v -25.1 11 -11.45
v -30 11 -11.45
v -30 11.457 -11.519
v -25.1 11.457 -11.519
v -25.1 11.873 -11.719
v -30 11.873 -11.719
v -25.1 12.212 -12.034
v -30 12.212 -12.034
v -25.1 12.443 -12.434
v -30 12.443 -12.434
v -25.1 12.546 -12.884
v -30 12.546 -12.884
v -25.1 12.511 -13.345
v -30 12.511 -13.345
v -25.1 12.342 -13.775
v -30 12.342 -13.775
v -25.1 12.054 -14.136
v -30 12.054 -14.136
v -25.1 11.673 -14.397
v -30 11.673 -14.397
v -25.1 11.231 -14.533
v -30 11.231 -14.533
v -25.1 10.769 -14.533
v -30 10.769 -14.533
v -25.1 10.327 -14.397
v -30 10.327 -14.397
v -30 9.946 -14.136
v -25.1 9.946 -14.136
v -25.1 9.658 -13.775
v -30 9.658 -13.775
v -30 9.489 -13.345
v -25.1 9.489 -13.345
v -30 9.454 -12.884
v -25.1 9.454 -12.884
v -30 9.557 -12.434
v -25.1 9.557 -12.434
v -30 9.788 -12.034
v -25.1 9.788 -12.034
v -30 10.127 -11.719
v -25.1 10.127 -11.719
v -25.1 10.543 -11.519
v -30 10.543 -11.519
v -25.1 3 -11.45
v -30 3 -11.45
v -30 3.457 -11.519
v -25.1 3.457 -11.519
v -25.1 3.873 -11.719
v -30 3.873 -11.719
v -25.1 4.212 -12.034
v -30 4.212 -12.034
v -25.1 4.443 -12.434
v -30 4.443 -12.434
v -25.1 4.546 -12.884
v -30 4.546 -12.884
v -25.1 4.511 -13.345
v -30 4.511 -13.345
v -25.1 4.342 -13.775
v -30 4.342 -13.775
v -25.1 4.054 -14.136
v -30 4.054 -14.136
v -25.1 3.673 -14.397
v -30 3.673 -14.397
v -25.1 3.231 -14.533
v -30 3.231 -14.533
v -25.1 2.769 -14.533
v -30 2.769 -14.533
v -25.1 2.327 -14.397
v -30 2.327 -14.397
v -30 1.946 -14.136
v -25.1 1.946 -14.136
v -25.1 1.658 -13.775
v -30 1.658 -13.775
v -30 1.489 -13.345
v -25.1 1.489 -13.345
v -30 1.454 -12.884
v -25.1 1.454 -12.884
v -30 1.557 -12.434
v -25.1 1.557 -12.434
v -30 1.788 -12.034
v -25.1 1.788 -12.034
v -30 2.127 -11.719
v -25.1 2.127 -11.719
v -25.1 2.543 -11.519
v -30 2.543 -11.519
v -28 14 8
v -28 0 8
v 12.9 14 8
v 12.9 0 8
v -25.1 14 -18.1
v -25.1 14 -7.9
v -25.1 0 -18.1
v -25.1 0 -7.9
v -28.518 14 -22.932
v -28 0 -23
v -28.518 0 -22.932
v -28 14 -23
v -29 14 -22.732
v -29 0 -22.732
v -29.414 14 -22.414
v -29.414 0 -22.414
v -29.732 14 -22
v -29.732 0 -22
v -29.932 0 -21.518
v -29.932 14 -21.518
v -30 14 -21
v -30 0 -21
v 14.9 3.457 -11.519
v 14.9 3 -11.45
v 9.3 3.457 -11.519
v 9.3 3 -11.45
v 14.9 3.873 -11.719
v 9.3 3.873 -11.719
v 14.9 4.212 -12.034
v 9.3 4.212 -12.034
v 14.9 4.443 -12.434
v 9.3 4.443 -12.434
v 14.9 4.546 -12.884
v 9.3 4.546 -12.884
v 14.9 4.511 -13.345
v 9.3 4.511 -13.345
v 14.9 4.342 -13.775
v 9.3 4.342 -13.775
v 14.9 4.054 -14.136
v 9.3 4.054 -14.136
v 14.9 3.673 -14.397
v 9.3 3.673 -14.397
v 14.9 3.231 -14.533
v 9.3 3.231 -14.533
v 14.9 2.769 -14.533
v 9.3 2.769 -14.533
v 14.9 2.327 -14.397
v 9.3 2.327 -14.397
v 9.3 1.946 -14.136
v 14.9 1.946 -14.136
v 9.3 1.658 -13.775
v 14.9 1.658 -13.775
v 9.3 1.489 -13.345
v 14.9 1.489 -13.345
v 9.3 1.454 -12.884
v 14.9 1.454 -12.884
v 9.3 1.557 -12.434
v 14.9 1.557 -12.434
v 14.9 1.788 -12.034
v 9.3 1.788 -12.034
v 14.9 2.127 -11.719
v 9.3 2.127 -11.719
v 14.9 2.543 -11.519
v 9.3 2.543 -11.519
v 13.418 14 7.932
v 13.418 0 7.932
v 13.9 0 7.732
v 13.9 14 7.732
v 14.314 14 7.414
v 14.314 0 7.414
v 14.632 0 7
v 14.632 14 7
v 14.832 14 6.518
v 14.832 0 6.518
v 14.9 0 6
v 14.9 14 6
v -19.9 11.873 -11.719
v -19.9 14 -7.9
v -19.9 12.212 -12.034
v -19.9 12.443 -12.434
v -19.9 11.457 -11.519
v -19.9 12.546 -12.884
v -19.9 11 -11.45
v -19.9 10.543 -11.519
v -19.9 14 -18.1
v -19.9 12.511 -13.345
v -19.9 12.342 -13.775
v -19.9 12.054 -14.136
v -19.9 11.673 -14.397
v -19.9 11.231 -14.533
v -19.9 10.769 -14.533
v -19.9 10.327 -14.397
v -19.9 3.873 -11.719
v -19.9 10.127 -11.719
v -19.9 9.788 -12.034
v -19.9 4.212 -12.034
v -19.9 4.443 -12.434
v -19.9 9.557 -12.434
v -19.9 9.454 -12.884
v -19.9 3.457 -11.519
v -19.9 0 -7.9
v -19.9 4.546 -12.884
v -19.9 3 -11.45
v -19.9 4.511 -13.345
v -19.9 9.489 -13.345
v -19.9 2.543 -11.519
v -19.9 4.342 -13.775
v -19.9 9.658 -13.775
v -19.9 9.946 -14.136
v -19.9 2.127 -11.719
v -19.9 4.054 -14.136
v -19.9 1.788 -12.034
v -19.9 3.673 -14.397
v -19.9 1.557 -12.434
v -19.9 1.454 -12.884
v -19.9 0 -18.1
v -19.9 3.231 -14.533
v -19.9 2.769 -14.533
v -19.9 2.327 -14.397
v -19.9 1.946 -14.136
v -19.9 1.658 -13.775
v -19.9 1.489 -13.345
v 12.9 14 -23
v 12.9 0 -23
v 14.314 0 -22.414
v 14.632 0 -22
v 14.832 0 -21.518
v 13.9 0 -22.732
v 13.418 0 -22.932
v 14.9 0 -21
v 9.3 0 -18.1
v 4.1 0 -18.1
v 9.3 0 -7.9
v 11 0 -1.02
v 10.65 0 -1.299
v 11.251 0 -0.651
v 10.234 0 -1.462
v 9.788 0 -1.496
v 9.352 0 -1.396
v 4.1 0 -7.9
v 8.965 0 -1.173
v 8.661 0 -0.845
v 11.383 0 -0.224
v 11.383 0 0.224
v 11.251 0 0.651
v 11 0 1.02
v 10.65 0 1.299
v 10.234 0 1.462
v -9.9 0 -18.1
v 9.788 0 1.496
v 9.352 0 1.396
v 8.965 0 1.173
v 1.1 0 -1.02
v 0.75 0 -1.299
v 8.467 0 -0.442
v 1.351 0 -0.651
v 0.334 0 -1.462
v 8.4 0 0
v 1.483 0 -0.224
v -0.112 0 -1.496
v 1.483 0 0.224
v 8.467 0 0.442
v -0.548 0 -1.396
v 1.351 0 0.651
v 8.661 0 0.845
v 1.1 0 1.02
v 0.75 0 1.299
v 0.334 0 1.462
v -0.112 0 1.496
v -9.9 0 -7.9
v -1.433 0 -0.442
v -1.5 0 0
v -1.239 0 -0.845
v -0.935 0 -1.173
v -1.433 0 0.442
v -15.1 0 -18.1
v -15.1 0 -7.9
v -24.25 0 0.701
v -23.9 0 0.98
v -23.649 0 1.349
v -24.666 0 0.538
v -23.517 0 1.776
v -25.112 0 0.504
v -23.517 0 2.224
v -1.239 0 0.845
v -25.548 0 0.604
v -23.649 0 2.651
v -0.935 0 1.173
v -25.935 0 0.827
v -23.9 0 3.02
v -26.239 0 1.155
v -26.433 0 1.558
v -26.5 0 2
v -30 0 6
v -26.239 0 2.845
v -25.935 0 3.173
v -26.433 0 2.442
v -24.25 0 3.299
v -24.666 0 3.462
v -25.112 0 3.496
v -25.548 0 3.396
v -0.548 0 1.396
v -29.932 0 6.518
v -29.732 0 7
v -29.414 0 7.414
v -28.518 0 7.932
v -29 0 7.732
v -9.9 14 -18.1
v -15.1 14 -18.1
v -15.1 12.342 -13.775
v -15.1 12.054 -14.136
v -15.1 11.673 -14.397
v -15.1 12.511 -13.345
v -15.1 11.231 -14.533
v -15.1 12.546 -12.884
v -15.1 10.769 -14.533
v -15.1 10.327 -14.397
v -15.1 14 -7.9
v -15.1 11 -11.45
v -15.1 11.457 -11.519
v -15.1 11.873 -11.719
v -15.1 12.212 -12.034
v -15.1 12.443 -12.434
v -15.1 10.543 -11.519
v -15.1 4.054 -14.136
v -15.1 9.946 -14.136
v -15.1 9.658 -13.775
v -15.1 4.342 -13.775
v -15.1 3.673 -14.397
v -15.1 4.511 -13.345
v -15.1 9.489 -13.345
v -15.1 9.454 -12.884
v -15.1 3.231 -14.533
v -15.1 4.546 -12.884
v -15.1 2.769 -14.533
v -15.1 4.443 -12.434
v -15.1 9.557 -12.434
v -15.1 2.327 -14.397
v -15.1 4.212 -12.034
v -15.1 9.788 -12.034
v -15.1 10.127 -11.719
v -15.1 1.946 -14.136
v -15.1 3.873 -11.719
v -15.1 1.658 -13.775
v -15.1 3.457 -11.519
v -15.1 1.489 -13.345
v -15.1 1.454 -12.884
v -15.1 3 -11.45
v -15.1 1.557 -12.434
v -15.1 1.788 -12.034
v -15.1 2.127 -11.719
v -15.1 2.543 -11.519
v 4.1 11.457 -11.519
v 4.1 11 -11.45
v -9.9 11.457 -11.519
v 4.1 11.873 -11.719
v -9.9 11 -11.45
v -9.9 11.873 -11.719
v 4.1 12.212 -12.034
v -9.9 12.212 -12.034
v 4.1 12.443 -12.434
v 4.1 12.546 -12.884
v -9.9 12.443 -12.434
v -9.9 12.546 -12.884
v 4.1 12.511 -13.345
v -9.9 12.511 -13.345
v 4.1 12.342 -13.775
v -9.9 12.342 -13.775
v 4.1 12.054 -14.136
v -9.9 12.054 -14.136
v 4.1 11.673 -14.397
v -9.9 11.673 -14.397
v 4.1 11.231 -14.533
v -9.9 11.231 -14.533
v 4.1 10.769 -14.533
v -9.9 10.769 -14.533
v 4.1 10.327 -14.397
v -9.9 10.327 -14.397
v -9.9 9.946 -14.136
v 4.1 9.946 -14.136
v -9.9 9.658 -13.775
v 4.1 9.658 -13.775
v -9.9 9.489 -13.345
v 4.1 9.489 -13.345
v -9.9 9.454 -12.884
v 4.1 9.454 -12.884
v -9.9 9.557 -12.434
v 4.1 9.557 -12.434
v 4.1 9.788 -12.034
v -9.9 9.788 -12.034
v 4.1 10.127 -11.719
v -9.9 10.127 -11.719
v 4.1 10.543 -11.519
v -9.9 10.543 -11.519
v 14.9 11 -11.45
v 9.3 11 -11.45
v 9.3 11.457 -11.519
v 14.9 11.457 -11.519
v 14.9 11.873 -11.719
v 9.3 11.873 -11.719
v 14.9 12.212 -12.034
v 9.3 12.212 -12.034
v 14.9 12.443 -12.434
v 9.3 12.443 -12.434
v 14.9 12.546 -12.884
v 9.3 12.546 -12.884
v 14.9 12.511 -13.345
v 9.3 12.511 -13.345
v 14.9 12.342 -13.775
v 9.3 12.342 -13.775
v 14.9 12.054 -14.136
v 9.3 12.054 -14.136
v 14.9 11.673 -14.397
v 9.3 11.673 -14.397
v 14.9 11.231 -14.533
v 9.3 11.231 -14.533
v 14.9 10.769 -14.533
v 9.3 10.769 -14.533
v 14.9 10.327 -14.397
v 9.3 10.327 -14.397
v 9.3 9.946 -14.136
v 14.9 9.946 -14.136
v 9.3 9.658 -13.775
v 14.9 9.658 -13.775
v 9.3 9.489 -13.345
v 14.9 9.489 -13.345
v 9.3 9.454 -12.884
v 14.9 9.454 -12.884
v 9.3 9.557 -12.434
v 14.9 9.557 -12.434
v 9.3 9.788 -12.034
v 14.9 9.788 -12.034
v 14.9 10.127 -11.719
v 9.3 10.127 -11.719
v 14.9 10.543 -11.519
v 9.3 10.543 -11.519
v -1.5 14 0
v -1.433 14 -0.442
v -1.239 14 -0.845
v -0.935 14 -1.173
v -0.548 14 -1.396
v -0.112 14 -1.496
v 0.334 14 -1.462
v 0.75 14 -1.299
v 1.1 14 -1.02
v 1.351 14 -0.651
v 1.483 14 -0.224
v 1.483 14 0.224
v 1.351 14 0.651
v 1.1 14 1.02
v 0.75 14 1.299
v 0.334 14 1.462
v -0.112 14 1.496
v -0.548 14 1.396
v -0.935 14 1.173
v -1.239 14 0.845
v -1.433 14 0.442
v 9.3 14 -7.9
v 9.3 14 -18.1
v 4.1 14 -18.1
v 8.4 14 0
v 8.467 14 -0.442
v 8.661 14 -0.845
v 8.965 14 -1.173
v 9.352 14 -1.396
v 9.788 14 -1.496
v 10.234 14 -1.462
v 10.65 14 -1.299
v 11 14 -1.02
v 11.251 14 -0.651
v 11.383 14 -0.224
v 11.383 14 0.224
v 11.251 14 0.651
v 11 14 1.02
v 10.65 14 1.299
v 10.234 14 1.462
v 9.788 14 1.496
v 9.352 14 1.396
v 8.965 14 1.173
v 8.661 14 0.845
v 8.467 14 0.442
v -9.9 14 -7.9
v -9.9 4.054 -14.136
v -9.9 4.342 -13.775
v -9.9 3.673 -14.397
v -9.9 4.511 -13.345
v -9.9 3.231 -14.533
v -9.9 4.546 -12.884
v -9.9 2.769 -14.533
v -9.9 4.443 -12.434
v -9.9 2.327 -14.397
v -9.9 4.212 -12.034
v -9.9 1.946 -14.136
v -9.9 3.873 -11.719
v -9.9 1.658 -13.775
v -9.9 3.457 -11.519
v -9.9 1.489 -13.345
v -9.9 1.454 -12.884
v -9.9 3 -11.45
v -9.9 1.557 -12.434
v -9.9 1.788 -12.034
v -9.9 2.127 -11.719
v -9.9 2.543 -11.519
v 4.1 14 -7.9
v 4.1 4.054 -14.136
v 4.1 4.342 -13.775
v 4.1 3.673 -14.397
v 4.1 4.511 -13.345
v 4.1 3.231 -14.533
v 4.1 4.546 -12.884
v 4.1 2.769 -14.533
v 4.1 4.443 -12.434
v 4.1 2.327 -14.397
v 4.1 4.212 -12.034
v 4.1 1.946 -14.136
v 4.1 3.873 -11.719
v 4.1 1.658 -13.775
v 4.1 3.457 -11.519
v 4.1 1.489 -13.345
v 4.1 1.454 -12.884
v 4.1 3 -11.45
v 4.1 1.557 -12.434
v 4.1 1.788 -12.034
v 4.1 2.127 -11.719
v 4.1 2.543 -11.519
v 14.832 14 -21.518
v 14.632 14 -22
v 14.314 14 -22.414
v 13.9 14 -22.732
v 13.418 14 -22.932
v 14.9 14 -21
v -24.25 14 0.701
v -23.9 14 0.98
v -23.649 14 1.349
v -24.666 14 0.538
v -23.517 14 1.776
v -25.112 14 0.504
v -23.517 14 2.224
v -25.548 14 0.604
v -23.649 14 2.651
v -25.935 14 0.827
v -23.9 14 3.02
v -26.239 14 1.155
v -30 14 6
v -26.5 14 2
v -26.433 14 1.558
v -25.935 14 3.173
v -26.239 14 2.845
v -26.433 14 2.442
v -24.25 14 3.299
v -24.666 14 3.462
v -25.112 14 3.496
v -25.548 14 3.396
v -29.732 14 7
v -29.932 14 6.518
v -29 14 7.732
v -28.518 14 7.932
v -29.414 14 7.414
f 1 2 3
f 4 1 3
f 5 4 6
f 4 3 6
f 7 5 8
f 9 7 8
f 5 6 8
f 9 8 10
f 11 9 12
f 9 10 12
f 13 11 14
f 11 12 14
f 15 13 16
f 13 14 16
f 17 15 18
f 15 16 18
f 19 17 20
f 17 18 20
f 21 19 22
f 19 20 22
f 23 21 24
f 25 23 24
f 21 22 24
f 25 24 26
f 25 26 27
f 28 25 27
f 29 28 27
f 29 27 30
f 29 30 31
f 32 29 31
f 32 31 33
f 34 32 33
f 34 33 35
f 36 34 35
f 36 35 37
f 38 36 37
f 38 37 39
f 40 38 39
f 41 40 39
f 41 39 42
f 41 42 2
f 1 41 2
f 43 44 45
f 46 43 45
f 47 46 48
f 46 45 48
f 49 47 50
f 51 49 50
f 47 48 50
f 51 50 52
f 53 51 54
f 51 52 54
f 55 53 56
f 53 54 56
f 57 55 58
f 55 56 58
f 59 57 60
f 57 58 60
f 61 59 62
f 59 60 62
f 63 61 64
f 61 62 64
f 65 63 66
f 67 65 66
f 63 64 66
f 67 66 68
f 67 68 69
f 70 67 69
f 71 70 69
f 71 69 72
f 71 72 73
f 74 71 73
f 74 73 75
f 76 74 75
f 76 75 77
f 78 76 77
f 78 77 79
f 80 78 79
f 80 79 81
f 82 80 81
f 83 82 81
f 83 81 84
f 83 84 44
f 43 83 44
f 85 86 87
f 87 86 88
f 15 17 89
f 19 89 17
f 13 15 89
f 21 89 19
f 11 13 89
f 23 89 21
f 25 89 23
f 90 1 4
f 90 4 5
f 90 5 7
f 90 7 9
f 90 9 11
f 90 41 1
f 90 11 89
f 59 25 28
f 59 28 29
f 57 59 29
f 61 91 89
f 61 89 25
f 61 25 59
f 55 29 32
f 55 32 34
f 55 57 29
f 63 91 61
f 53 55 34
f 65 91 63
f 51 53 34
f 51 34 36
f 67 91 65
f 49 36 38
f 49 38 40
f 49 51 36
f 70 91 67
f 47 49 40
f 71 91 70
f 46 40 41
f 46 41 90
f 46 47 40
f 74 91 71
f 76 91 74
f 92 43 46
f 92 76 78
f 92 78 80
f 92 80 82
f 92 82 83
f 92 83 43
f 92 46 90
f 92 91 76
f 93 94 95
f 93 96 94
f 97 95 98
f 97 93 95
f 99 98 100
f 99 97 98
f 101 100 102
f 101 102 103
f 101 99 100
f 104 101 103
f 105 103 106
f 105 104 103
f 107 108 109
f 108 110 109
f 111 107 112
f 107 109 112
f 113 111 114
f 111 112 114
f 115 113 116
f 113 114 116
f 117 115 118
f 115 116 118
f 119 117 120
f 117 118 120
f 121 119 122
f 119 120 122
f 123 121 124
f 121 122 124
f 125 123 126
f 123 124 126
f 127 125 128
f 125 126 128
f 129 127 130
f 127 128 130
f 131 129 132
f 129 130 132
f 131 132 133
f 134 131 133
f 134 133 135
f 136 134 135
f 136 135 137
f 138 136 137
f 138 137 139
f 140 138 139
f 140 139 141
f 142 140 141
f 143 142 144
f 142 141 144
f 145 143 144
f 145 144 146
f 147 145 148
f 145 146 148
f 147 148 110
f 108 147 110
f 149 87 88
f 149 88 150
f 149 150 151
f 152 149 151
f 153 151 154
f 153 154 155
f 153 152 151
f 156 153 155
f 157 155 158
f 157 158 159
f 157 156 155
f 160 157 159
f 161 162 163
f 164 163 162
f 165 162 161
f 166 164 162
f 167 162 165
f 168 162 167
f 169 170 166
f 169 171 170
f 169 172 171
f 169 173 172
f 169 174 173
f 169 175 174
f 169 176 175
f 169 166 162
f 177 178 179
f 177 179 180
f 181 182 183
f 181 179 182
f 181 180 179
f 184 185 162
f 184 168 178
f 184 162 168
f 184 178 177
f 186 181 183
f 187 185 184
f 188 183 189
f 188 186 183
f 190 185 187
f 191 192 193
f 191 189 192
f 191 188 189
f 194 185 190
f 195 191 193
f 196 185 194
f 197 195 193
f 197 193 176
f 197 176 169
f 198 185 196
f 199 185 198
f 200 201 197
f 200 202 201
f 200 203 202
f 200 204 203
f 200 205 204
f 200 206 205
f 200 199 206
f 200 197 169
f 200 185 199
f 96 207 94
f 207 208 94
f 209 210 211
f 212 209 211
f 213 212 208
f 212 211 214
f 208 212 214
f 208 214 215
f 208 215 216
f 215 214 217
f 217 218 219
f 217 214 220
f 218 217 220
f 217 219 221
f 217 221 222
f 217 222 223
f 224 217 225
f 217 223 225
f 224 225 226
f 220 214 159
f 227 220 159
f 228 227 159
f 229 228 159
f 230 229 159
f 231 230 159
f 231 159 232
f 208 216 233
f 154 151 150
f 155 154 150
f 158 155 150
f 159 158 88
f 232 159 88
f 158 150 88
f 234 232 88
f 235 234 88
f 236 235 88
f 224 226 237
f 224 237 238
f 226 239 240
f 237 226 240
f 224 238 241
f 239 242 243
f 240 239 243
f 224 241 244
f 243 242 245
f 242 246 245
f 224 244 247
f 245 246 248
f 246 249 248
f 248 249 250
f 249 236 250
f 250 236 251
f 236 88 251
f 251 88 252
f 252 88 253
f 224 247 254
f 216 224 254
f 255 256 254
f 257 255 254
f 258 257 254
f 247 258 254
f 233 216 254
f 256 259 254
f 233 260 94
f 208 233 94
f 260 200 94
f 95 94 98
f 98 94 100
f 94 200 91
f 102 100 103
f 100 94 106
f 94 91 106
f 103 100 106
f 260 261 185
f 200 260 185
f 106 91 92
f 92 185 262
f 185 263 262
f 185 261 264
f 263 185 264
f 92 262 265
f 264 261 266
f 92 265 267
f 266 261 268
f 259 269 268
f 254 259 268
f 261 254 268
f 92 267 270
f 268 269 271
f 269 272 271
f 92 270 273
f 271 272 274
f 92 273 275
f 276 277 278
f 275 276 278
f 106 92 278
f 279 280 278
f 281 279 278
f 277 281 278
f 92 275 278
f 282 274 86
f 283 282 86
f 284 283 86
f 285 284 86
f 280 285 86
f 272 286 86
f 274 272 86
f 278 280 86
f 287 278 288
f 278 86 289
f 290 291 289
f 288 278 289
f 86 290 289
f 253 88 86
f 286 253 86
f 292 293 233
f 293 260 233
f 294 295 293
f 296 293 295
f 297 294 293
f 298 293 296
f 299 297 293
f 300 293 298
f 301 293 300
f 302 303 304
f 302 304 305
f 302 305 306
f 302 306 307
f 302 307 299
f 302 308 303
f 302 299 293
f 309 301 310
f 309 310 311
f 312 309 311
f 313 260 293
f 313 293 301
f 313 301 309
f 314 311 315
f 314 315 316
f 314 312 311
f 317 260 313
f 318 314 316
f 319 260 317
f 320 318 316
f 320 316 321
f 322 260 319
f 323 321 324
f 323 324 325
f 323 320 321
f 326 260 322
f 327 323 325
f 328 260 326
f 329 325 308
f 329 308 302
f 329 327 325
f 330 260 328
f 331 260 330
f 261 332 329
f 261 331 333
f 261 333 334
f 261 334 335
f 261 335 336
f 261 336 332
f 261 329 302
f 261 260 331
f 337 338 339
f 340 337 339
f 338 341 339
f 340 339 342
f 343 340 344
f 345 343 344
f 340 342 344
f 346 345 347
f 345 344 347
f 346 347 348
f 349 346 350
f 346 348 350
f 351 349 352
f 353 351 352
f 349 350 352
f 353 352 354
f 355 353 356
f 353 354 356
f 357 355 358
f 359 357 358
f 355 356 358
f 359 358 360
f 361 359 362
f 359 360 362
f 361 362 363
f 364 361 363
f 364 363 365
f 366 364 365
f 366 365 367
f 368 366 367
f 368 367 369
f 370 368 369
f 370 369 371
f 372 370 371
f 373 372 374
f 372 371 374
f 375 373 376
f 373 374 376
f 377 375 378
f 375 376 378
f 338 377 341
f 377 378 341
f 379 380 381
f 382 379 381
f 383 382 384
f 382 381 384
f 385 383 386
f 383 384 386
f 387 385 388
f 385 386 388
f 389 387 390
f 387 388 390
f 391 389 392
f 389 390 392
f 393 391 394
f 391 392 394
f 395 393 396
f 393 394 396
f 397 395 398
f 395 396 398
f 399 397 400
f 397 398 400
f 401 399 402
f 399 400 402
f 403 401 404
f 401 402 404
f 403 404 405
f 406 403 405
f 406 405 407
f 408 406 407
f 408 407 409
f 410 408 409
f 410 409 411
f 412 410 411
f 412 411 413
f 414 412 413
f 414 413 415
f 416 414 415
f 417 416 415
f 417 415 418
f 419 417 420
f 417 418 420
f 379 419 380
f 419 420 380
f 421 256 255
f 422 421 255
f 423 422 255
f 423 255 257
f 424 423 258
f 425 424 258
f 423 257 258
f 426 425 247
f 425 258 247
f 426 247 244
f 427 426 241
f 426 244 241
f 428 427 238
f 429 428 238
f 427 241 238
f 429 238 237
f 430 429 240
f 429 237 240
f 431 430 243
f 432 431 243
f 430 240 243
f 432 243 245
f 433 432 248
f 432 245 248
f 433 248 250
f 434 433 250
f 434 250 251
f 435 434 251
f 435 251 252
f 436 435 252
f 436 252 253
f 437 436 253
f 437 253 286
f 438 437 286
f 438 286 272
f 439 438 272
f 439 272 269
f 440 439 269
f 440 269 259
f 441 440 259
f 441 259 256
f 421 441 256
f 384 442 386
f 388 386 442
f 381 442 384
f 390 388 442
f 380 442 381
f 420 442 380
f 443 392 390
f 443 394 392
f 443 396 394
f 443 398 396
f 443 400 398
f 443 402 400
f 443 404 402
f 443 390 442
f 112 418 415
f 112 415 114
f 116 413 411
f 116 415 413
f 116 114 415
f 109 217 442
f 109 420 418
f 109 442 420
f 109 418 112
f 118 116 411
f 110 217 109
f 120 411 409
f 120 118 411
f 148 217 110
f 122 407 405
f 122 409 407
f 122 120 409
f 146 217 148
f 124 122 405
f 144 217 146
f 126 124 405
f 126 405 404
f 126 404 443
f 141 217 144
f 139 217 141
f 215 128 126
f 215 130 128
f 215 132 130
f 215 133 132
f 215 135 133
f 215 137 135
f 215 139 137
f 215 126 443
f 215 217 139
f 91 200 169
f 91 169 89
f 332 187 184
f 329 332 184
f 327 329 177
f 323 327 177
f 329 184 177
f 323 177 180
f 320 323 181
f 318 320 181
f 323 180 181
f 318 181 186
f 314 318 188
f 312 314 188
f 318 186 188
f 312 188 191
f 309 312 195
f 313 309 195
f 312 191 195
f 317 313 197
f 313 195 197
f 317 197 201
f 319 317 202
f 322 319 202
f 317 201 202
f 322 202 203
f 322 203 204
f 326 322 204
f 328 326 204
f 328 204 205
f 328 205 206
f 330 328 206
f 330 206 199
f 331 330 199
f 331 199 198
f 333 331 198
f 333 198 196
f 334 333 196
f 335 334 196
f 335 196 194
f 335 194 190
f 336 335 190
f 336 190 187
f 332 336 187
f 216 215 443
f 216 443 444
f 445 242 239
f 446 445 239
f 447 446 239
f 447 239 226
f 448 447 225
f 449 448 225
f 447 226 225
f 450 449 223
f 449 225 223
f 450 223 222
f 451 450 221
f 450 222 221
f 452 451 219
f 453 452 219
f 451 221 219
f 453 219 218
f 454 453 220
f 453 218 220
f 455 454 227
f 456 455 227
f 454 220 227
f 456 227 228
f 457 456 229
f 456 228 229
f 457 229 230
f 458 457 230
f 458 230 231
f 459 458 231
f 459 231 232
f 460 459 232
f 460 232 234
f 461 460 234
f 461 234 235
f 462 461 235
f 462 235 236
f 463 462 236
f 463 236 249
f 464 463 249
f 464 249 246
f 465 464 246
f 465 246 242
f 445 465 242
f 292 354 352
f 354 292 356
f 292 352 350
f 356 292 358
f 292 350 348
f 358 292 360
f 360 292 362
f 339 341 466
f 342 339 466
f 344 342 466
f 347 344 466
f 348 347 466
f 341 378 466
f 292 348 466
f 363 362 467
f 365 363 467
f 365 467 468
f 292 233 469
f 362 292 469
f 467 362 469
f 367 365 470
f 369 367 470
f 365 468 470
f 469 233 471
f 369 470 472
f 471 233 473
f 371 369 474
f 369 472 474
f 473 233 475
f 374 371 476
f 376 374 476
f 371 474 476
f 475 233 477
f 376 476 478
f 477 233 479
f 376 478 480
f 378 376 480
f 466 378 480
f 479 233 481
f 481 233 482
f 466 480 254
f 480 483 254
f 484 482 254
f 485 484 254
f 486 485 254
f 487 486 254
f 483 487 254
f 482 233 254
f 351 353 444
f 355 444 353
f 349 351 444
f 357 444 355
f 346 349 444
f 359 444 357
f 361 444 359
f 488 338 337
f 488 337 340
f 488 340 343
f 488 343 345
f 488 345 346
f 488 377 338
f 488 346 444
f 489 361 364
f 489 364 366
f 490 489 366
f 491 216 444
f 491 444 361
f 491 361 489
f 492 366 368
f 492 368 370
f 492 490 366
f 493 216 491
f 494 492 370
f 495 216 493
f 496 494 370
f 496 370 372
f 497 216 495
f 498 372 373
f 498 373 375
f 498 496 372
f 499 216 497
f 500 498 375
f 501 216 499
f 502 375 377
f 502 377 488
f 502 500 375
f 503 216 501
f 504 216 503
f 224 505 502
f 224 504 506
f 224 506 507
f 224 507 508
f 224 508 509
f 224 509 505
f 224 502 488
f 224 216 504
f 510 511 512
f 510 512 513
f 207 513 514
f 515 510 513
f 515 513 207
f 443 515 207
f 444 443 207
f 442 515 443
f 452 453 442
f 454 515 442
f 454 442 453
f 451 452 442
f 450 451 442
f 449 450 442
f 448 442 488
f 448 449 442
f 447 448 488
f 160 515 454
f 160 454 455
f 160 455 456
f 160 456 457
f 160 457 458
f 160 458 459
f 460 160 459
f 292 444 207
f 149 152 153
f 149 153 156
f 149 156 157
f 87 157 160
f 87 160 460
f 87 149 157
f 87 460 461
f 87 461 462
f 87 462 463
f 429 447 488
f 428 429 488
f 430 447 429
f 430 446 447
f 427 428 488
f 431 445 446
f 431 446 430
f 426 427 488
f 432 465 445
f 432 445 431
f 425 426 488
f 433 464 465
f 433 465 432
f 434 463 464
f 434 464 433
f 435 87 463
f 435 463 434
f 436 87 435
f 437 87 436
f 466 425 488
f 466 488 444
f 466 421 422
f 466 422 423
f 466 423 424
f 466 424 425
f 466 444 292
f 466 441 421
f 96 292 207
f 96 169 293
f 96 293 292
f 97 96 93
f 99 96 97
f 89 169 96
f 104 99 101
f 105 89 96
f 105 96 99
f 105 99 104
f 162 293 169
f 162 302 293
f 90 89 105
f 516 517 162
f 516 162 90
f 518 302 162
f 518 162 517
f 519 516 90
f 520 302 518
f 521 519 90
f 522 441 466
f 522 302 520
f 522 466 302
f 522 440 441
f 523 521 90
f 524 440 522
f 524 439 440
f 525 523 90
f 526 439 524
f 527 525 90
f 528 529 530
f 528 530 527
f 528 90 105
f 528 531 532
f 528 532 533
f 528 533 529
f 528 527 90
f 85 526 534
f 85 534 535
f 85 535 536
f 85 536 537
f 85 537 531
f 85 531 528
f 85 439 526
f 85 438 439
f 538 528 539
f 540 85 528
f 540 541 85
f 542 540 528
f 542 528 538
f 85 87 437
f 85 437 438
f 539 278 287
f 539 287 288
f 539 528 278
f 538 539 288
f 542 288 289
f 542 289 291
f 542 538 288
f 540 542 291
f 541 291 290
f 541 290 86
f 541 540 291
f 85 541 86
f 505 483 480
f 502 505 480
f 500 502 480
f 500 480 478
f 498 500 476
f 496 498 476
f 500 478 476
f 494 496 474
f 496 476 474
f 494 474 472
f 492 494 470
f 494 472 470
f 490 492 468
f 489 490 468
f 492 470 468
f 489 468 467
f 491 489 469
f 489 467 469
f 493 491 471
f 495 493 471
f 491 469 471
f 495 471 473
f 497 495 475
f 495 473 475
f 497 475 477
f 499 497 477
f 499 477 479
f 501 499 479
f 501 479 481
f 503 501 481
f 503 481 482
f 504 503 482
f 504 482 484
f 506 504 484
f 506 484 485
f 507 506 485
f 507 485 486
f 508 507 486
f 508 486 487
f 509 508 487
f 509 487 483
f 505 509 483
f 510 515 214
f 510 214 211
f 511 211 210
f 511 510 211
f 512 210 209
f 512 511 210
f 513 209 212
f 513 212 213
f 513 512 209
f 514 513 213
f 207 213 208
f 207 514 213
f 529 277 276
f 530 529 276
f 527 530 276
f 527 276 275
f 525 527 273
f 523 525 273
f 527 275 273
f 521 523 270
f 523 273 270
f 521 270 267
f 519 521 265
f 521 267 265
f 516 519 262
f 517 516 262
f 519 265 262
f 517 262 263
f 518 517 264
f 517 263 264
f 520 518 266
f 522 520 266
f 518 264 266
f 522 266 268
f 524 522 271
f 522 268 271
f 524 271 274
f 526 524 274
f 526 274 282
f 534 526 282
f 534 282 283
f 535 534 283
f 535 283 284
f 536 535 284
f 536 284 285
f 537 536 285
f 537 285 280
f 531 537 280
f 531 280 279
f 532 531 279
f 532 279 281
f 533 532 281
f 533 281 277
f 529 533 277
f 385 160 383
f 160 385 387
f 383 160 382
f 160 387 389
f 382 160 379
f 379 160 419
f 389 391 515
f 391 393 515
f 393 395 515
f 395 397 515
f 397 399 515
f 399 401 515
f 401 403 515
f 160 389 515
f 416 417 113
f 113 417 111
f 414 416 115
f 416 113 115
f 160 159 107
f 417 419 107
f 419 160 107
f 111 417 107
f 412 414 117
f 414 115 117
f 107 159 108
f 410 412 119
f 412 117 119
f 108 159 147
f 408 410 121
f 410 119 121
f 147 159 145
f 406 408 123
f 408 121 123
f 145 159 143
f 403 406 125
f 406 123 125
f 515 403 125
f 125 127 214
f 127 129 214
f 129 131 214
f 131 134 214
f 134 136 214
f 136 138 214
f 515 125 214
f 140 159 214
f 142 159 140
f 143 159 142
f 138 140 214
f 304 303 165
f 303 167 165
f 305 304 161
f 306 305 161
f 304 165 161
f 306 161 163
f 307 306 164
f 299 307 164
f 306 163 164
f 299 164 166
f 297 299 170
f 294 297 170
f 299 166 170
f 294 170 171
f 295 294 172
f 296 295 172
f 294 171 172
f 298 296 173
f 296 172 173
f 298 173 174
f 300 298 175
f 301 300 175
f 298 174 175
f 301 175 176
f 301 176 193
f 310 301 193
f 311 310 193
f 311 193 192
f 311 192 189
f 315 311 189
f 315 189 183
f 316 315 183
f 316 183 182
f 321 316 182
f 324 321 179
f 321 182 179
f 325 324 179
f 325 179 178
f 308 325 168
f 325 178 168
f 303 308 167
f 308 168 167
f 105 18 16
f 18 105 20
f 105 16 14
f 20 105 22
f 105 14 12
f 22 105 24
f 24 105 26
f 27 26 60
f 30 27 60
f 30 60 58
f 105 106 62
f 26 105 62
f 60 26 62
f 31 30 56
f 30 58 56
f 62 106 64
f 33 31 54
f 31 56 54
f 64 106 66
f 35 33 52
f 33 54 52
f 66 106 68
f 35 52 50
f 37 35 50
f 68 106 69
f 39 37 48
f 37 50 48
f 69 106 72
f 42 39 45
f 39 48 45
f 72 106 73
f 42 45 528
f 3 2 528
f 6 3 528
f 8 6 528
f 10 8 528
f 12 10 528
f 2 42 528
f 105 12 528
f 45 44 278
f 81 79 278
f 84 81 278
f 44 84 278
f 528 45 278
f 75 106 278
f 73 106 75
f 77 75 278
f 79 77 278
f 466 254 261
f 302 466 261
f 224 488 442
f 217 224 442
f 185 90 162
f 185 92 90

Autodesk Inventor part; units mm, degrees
ref_plane "YZ Plane" through (0, 0, 0) normal (1, 0, 0) x (0, 1, 0)
ref_plane "XZ Plane" through (0, 0, 0) normal (0, 1, 0) x (-1, 0, 0)
ref_plane "XY Plane" through (0, 0, 0) normal (0, 0, 1) x (1, 0, 0)
sketch "Sketch1" plane through (0, 0, 0) normal (0, 1, 0) x (-1, 0, 0)
  circle A0 centre (0, 0) radius 1.5
  circle A1 centre (25, 2) radius 1.5
  line L0 (30, 8) -> (-14.9, 8)
  line L1 (-14.9, 8) -> (-14.9, -23)
  line L2 (-14.9, -23) -> (30, -23)
  line L3 (30, -23) -> (30, 8)
  line L4 (-14.9, -8) -> (30, -8) construction
  circle A2 centre (-9.9, 0) radius 1.5
  line L5 (25, -8) -> (20, -8)
  line L6 (20, -8) -> (20, -18)
  line L7 (20, -18) -> (25, -18)
  line L8 (25, -18) -> (25, -8)
  line L9 (20, -8) -> (20, -18)
  line L10 (20, -18) -> (15, -18)
  line L11 (15, -18) -> (15, -8)
  line L12 (15, -8) -> (20, -8)
  line L13 (15, -8) -> (15, -18)
  line L14 (15, -18) -> (10, -18)
  line L15 (10, -18) -> (10, -8)
  line L16 (10, -8) -> (15, -8)
  line L17 (-4.2, -23) -> (-14.9, -23)
  line L18 (-14.9, -23) -> (-14.9, -8)
  line L19 (-9.2, -8) -> (-9.2, -18)
  line L20 (-9.2, -18) -> (-4.2, -18)
  line L21 (-4.2, -18) -> (-4.2, -8)
  line L22 (-4.2, -8) -> (-9.2, -8)
  dimension "d0" = 3
  dimension "d1" = 3
  dimension "d3" = 25
  dimension "d4" = 2
  dimension "d5" = 8
  dimension "d6" = 6
  dimension "d7" = 5
  dimension "d9" = 3
  dimension "d10" = 9.9
  dimension "d11" = 5
  dimension "d12" = 10
  dimension "d13" = 5
  dimension "d14" = 5
  dimension "d15" = 5
  dimension "d16" = 5
  dimension "d37" = 5
  dimension "d38" = 14.2
  dimension "d39" = 5
extrude "Extrusion1" add sketch "Sketch1" along normal blind 14 contours L3 L2 L1 L0 | L6 L10 L11 L12
fillet "Fillet1" radius 2 4 edges at (-30, 7, 8) (-30, 7, -23) (14.9, 7, 8) (14.9, 7, -23)
sketch "Sketch2" plane through (-30, 0, -21) normal (-1, 0, 0) x (0, 0, 1)
  line L0 (3, 0) -> (13, 0) projected
  line L1 (13, 0) -> (13, 14) projected
  line L2 (3, 14) -> (13, 14) projected
  line L3 (3, 0) -> (3, 14) projected
  circle A0 centre (8, 11) radius 1.55
  circle A1 centre (8, 3) radius 1.55
  line L4 (3, 0) -> (3, 14) projected
  point P0 (21, 0)
  dimension "d21" = 3.1
  dimension "d22" = 3.1
  dimension "d23" = 3
  dimension "d24" = 3
  dimension "d35" = 5
  dimension "d36" = 5
extrude "Extrusion2" cut sketch "Sketch2" against normal blind 50 contours A0 | A1
thicken "Thicken1" operation add thickness 0.1 both sides no extend neighbours yes toward (1, 0, 0) faces at (-20, 8.0932, -9.2092) (-21.6667, 4.6667, -8) (-25, 8.0932, -9.2092) (-23.3333, 4.6667, -18)
thicken "Thicken2" operation add thickness 0.1 both sides no extend neighbours yes toward (0, 0, 1) faces at (-11.6667, 4.6667, -8) (-15, 8.0932, -9.2092) (-13.3333, 4.6667, -18) (-10, 5.9068, -16.7908)
thicken "Thicken3" operation add thickness 0.1 both sides no extend neighbours yes toward (-1, 0, 0) faces at (4.2, 8.0932, -16.7908) (5.8667, 4.6667, -18) (9.2, 5.9068, -16.7908) (7.5333, 4.6667, -8)
properties part number "Bar_connection_block"
